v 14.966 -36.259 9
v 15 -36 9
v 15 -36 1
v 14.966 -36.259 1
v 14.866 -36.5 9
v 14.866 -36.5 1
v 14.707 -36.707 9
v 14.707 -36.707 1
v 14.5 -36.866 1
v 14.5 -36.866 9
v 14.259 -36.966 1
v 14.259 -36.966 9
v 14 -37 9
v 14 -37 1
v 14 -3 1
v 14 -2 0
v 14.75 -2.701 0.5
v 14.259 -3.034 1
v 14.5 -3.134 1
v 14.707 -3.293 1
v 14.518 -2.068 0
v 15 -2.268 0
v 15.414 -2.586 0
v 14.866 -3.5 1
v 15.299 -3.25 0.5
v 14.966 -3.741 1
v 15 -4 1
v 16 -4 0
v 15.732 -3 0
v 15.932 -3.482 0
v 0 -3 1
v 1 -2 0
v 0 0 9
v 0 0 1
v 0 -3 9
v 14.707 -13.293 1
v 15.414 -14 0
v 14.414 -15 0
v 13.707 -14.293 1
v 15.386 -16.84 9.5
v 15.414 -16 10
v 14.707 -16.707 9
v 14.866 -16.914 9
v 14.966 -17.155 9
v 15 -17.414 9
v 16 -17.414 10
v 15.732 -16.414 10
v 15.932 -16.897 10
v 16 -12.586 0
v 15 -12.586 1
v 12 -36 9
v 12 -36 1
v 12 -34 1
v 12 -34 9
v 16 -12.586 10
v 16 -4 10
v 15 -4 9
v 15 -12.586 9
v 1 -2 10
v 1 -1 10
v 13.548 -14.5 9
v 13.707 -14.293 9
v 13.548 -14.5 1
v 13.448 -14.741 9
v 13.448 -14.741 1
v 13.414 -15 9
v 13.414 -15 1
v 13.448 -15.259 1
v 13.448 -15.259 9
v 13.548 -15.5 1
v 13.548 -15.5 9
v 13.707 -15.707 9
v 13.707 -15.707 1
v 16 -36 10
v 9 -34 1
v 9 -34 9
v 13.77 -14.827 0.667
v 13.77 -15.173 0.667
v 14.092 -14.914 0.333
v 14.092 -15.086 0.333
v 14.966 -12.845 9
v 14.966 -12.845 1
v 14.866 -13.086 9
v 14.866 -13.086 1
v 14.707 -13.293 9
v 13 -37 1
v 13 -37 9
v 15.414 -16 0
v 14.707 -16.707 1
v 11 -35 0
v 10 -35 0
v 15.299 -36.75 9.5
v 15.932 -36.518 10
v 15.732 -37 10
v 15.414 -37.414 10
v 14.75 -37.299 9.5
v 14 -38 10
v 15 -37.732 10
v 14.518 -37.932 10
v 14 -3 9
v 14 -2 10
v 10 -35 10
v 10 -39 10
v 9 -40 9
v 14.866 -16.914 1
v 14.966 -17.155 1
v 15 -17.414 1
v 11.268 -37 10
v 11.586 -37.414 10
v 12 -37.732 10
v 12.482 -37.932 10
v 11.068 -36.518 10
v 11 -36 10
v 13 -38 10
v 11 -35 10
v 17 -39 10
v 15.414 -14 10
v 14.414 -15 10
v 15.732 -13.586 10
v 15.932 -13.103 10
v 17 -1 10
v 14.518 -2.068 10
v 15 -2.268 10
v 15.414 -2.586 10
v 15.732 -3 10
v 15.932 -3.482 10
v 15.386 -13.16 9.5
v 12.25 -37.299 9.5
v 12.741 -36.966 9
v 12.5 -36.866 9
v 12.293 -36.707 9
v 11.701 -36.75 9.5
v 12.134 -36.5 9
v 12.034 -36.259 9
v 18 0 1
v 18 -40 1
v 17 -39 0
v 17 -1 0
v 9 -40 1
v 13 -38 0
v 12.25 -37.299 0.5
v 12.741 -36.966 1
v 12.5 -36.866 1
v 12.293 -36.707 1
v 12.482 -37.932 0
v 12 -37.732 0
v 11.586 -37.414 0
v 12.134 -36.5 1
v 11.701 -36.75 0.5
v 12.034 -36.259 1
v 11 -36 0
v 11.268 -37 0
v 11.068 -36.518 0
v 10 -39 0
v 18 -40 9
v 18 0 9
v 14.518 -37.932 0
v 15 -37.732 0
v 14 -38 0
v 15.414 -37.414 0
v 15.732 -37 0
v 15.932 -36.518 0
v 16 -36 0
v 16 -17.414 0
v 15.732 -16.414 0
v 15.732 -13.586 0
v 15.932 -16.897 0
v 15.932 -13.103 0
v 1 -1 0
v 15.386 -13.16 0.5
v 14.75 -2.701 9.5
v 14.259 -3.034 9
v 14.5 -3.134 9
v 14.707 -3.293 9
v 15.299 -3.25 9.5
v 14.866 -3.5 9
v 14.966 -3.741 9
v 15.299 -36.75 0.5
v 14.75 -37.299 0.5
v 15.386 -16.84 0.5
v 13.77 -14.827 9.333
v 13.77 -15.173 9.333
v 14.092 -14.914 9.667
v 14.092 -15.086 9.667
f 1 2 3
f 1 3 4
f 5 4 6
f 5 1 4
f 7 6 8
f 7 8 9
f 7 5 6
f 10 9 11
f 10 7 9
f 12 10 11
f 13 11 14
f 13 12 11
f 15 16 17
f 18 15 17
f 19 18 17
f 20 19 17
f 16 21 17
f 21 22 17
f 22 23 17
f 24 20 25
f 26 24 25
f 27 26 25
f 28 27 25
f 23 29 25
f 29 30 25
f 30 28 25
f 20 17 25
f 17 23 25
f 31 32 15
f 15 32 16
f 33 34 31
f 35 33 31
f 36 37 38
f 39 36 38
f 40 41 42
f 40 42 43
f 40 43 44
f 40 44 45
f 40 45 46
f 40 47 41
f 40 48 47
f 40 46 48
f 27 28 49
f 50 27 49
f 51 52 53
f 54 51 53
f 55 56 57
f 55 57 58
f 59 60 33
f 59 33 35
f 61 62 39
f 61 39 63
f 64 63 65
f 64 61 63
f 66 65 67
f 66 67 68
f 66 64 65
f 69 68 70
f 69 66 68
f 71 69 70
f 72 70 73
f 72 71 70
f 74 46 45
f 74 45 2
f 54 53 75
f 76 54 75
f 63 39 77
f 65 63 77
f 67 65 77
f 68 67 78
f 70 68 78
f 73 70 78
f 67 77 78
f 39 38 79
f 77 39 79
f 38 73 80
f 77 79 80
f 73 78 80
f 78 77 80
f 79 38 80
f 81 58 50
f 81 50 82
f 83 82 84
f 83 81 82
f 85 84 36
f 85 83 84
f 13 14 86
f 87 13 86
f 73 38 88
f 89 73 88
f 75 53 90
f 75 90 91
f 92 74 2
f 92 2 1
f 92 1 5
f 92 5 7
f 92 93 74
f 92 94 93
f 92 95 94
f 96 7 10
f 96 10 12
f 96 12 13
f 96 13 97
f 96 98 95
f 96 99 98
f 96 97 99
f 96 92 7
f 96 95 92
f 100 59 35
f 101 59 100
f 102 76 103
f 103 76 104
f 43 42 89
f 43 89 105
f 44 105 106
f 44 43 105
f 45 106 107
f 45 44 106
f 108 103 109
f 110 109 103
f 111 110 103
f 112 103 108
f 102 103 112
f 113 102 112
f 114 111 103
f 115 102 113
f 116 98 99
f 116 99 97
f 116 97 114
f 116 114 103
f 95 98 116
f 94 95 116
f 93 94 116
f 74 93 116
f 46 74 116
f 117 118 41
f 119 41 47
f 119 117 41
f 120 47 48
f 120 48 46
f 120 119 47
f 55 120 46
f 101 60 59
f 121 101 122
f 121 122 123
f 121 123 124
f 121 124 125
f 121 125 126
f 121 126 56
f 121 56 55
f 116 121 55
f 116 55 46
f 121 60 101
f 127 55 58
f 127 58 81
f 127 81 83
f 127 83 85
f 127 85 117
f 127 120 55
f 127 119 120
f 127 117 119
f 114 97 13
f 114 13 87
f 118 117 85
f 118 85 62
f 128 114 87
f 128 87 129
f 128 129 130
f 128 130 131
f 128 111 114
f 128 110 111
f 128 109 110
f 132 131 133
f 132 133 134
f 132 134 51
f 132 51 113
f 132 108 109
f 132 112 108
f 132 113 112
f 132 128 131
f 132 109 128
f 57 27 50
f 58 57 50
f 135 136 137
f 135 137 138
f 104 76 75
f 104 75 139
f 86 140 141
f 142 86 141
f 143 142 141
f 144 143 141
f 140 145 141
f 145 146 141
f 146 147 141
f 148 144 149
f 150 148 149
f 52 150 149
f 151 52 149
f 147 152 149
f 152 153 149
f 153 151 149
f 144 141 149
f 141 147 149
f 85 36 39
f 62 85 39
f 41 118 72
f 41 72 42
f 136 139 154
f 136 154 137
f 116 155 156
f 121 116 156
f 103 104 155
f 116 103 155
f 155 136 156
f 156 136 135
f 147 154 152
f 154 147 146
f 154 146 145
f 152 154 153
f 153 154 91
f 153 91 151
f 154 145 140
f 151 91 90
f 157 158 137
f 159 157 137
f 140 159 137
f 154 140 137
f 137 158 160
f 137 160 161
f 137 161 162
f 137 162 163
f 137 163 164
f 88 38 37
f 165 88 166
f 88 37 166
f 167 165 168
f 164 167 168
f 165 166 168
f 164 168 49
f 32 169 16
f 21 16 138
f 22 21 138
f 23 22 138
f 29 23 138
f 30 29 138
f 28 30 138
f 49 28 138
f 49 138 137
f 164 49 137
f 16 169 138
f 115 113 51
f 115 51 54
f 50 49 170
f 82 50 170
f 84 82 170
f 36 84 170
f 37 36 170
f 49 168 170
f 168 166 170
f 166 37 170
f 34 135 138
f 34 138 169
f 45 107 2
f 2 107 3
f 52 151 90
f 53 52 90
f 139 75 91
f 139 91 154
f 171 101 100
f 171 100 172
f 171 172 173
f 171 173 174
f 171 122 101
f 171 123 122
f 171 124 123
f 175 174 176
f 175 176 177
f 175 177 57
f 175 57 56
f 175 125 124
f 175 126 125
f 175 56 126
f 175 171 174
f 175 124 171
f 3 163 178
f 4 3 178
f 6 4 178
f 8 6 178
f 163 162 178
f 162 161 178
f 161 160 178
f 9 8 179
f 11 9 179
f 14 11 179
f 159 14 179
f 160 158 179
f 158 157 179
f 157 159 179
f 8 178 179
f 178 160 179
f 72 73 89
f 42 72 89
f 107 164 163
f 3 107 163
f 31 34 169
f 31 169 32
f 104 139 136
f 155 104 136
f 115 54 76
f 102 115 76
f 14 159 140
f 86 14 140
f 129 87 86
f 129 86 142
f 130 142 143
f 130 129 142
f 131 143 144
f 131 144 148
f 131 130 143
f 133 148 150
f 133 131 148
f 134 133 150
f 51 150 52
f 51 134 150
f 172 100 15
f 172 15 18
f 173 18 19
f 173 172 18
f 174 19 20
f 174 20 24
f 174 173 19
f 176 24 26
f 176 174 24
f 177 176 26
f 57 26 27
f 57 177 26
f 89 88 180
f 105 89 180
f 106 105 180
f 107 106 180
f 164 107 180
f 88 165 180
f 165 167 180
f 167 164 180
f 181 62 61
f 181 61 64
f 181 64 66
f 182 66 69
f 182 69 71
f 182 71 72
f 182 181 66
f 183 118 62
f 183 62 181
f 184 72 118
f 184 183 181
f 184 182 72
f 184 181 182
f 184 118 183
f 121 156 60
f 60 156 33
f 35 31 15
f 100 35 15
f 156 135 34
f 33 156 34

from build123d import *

# Parameters (mm, degrees)
F1_DEPTH = 10
F2_R     = 1
F3_SIZE  = 0.99999


# Not quite as in the source:
# - a fillet or chamfer is up to 0.001 mm smaller than in the source, because OpenCascade refuses the exact size


with BuildPart() as f1:
    # F0 (on Top) → F1 (new body)
    with BuildSketch(Plane.XY):
        Polygon((18, 0), (0, 0), (0, -3), (15, -3), (15, -13), (13, -15), (15, -17), (15, -37), (12, -37), (12, -34), (9, -34), (9, -40), (18, -40), align=None)
    extrude(amount=F1_DEPTH)

    # F2
    f2_edges = [f1.edges().sort_by_distance(p)[0] for p in [
        (13, -15, 5),
        (15, -13, 5),
        (15, -37, 5),
        (15, -17, 5),
        (15, -3, 5),
        (12, -37, 5),
    ]]
    fillet(f2_edges, radius=F2_R)

    # F3 (size 1 in the source; OpenCascade refuses exactly that, so slightly less here)
    f3_edges = [f1.edges().sort_by_distance(p)[0] for p in [
        (7, -3, 10),
        (14.707107, -3.292893, 10),
        (0, -1.5, 10),
        (15, -8.292893, 10),
        (9, 0, 10),
        (14.92388, -12.96847, 10),
        (18, -20, 10),
        (14.207107, -13.792893, 10),
        (13.5, -40, 10),
        (13.414214, -15, 10),
        (9, -37, 10),
        (14.207107, -16.207107, 10),
        (10.5, -34, 10),
        (14.92388, -17.03153, 10),
        (12, -35, 10),
        (15, -26.707107, 10),
        (12.292893, -36.707107, 10),
        (14.707107, -36.707107, 10),
        (13.5, -37, 10),
        (7, -3, 0),
        (14.707107, -3.292893, 0),
        (0, -1.5, 0),
        (15, -8.292893, 0),
        (9, 0, 0),
        (14.92388, -12.96847, 0),
        (18, -20, 0),
        (14.207107, -13.792893, 0),
        (13.5, -40, 0),
        (13.414214, -15, 0),
        (9, -37, 0),
        (14.207107, -16.207107, 0),
        (10.5, -34, 0),
        (14.92388, -17.03153, 0),
        (12, -35, 0),
        (15, -26.707107, 0),
        (12.292893, -36.707107, 0),
        (14.707107, -36.707107, 0),
        (13.5, -37, 0),
    ]]
    chamfer(f3_edges, length=F3_SIZE)


solid = f1.part
